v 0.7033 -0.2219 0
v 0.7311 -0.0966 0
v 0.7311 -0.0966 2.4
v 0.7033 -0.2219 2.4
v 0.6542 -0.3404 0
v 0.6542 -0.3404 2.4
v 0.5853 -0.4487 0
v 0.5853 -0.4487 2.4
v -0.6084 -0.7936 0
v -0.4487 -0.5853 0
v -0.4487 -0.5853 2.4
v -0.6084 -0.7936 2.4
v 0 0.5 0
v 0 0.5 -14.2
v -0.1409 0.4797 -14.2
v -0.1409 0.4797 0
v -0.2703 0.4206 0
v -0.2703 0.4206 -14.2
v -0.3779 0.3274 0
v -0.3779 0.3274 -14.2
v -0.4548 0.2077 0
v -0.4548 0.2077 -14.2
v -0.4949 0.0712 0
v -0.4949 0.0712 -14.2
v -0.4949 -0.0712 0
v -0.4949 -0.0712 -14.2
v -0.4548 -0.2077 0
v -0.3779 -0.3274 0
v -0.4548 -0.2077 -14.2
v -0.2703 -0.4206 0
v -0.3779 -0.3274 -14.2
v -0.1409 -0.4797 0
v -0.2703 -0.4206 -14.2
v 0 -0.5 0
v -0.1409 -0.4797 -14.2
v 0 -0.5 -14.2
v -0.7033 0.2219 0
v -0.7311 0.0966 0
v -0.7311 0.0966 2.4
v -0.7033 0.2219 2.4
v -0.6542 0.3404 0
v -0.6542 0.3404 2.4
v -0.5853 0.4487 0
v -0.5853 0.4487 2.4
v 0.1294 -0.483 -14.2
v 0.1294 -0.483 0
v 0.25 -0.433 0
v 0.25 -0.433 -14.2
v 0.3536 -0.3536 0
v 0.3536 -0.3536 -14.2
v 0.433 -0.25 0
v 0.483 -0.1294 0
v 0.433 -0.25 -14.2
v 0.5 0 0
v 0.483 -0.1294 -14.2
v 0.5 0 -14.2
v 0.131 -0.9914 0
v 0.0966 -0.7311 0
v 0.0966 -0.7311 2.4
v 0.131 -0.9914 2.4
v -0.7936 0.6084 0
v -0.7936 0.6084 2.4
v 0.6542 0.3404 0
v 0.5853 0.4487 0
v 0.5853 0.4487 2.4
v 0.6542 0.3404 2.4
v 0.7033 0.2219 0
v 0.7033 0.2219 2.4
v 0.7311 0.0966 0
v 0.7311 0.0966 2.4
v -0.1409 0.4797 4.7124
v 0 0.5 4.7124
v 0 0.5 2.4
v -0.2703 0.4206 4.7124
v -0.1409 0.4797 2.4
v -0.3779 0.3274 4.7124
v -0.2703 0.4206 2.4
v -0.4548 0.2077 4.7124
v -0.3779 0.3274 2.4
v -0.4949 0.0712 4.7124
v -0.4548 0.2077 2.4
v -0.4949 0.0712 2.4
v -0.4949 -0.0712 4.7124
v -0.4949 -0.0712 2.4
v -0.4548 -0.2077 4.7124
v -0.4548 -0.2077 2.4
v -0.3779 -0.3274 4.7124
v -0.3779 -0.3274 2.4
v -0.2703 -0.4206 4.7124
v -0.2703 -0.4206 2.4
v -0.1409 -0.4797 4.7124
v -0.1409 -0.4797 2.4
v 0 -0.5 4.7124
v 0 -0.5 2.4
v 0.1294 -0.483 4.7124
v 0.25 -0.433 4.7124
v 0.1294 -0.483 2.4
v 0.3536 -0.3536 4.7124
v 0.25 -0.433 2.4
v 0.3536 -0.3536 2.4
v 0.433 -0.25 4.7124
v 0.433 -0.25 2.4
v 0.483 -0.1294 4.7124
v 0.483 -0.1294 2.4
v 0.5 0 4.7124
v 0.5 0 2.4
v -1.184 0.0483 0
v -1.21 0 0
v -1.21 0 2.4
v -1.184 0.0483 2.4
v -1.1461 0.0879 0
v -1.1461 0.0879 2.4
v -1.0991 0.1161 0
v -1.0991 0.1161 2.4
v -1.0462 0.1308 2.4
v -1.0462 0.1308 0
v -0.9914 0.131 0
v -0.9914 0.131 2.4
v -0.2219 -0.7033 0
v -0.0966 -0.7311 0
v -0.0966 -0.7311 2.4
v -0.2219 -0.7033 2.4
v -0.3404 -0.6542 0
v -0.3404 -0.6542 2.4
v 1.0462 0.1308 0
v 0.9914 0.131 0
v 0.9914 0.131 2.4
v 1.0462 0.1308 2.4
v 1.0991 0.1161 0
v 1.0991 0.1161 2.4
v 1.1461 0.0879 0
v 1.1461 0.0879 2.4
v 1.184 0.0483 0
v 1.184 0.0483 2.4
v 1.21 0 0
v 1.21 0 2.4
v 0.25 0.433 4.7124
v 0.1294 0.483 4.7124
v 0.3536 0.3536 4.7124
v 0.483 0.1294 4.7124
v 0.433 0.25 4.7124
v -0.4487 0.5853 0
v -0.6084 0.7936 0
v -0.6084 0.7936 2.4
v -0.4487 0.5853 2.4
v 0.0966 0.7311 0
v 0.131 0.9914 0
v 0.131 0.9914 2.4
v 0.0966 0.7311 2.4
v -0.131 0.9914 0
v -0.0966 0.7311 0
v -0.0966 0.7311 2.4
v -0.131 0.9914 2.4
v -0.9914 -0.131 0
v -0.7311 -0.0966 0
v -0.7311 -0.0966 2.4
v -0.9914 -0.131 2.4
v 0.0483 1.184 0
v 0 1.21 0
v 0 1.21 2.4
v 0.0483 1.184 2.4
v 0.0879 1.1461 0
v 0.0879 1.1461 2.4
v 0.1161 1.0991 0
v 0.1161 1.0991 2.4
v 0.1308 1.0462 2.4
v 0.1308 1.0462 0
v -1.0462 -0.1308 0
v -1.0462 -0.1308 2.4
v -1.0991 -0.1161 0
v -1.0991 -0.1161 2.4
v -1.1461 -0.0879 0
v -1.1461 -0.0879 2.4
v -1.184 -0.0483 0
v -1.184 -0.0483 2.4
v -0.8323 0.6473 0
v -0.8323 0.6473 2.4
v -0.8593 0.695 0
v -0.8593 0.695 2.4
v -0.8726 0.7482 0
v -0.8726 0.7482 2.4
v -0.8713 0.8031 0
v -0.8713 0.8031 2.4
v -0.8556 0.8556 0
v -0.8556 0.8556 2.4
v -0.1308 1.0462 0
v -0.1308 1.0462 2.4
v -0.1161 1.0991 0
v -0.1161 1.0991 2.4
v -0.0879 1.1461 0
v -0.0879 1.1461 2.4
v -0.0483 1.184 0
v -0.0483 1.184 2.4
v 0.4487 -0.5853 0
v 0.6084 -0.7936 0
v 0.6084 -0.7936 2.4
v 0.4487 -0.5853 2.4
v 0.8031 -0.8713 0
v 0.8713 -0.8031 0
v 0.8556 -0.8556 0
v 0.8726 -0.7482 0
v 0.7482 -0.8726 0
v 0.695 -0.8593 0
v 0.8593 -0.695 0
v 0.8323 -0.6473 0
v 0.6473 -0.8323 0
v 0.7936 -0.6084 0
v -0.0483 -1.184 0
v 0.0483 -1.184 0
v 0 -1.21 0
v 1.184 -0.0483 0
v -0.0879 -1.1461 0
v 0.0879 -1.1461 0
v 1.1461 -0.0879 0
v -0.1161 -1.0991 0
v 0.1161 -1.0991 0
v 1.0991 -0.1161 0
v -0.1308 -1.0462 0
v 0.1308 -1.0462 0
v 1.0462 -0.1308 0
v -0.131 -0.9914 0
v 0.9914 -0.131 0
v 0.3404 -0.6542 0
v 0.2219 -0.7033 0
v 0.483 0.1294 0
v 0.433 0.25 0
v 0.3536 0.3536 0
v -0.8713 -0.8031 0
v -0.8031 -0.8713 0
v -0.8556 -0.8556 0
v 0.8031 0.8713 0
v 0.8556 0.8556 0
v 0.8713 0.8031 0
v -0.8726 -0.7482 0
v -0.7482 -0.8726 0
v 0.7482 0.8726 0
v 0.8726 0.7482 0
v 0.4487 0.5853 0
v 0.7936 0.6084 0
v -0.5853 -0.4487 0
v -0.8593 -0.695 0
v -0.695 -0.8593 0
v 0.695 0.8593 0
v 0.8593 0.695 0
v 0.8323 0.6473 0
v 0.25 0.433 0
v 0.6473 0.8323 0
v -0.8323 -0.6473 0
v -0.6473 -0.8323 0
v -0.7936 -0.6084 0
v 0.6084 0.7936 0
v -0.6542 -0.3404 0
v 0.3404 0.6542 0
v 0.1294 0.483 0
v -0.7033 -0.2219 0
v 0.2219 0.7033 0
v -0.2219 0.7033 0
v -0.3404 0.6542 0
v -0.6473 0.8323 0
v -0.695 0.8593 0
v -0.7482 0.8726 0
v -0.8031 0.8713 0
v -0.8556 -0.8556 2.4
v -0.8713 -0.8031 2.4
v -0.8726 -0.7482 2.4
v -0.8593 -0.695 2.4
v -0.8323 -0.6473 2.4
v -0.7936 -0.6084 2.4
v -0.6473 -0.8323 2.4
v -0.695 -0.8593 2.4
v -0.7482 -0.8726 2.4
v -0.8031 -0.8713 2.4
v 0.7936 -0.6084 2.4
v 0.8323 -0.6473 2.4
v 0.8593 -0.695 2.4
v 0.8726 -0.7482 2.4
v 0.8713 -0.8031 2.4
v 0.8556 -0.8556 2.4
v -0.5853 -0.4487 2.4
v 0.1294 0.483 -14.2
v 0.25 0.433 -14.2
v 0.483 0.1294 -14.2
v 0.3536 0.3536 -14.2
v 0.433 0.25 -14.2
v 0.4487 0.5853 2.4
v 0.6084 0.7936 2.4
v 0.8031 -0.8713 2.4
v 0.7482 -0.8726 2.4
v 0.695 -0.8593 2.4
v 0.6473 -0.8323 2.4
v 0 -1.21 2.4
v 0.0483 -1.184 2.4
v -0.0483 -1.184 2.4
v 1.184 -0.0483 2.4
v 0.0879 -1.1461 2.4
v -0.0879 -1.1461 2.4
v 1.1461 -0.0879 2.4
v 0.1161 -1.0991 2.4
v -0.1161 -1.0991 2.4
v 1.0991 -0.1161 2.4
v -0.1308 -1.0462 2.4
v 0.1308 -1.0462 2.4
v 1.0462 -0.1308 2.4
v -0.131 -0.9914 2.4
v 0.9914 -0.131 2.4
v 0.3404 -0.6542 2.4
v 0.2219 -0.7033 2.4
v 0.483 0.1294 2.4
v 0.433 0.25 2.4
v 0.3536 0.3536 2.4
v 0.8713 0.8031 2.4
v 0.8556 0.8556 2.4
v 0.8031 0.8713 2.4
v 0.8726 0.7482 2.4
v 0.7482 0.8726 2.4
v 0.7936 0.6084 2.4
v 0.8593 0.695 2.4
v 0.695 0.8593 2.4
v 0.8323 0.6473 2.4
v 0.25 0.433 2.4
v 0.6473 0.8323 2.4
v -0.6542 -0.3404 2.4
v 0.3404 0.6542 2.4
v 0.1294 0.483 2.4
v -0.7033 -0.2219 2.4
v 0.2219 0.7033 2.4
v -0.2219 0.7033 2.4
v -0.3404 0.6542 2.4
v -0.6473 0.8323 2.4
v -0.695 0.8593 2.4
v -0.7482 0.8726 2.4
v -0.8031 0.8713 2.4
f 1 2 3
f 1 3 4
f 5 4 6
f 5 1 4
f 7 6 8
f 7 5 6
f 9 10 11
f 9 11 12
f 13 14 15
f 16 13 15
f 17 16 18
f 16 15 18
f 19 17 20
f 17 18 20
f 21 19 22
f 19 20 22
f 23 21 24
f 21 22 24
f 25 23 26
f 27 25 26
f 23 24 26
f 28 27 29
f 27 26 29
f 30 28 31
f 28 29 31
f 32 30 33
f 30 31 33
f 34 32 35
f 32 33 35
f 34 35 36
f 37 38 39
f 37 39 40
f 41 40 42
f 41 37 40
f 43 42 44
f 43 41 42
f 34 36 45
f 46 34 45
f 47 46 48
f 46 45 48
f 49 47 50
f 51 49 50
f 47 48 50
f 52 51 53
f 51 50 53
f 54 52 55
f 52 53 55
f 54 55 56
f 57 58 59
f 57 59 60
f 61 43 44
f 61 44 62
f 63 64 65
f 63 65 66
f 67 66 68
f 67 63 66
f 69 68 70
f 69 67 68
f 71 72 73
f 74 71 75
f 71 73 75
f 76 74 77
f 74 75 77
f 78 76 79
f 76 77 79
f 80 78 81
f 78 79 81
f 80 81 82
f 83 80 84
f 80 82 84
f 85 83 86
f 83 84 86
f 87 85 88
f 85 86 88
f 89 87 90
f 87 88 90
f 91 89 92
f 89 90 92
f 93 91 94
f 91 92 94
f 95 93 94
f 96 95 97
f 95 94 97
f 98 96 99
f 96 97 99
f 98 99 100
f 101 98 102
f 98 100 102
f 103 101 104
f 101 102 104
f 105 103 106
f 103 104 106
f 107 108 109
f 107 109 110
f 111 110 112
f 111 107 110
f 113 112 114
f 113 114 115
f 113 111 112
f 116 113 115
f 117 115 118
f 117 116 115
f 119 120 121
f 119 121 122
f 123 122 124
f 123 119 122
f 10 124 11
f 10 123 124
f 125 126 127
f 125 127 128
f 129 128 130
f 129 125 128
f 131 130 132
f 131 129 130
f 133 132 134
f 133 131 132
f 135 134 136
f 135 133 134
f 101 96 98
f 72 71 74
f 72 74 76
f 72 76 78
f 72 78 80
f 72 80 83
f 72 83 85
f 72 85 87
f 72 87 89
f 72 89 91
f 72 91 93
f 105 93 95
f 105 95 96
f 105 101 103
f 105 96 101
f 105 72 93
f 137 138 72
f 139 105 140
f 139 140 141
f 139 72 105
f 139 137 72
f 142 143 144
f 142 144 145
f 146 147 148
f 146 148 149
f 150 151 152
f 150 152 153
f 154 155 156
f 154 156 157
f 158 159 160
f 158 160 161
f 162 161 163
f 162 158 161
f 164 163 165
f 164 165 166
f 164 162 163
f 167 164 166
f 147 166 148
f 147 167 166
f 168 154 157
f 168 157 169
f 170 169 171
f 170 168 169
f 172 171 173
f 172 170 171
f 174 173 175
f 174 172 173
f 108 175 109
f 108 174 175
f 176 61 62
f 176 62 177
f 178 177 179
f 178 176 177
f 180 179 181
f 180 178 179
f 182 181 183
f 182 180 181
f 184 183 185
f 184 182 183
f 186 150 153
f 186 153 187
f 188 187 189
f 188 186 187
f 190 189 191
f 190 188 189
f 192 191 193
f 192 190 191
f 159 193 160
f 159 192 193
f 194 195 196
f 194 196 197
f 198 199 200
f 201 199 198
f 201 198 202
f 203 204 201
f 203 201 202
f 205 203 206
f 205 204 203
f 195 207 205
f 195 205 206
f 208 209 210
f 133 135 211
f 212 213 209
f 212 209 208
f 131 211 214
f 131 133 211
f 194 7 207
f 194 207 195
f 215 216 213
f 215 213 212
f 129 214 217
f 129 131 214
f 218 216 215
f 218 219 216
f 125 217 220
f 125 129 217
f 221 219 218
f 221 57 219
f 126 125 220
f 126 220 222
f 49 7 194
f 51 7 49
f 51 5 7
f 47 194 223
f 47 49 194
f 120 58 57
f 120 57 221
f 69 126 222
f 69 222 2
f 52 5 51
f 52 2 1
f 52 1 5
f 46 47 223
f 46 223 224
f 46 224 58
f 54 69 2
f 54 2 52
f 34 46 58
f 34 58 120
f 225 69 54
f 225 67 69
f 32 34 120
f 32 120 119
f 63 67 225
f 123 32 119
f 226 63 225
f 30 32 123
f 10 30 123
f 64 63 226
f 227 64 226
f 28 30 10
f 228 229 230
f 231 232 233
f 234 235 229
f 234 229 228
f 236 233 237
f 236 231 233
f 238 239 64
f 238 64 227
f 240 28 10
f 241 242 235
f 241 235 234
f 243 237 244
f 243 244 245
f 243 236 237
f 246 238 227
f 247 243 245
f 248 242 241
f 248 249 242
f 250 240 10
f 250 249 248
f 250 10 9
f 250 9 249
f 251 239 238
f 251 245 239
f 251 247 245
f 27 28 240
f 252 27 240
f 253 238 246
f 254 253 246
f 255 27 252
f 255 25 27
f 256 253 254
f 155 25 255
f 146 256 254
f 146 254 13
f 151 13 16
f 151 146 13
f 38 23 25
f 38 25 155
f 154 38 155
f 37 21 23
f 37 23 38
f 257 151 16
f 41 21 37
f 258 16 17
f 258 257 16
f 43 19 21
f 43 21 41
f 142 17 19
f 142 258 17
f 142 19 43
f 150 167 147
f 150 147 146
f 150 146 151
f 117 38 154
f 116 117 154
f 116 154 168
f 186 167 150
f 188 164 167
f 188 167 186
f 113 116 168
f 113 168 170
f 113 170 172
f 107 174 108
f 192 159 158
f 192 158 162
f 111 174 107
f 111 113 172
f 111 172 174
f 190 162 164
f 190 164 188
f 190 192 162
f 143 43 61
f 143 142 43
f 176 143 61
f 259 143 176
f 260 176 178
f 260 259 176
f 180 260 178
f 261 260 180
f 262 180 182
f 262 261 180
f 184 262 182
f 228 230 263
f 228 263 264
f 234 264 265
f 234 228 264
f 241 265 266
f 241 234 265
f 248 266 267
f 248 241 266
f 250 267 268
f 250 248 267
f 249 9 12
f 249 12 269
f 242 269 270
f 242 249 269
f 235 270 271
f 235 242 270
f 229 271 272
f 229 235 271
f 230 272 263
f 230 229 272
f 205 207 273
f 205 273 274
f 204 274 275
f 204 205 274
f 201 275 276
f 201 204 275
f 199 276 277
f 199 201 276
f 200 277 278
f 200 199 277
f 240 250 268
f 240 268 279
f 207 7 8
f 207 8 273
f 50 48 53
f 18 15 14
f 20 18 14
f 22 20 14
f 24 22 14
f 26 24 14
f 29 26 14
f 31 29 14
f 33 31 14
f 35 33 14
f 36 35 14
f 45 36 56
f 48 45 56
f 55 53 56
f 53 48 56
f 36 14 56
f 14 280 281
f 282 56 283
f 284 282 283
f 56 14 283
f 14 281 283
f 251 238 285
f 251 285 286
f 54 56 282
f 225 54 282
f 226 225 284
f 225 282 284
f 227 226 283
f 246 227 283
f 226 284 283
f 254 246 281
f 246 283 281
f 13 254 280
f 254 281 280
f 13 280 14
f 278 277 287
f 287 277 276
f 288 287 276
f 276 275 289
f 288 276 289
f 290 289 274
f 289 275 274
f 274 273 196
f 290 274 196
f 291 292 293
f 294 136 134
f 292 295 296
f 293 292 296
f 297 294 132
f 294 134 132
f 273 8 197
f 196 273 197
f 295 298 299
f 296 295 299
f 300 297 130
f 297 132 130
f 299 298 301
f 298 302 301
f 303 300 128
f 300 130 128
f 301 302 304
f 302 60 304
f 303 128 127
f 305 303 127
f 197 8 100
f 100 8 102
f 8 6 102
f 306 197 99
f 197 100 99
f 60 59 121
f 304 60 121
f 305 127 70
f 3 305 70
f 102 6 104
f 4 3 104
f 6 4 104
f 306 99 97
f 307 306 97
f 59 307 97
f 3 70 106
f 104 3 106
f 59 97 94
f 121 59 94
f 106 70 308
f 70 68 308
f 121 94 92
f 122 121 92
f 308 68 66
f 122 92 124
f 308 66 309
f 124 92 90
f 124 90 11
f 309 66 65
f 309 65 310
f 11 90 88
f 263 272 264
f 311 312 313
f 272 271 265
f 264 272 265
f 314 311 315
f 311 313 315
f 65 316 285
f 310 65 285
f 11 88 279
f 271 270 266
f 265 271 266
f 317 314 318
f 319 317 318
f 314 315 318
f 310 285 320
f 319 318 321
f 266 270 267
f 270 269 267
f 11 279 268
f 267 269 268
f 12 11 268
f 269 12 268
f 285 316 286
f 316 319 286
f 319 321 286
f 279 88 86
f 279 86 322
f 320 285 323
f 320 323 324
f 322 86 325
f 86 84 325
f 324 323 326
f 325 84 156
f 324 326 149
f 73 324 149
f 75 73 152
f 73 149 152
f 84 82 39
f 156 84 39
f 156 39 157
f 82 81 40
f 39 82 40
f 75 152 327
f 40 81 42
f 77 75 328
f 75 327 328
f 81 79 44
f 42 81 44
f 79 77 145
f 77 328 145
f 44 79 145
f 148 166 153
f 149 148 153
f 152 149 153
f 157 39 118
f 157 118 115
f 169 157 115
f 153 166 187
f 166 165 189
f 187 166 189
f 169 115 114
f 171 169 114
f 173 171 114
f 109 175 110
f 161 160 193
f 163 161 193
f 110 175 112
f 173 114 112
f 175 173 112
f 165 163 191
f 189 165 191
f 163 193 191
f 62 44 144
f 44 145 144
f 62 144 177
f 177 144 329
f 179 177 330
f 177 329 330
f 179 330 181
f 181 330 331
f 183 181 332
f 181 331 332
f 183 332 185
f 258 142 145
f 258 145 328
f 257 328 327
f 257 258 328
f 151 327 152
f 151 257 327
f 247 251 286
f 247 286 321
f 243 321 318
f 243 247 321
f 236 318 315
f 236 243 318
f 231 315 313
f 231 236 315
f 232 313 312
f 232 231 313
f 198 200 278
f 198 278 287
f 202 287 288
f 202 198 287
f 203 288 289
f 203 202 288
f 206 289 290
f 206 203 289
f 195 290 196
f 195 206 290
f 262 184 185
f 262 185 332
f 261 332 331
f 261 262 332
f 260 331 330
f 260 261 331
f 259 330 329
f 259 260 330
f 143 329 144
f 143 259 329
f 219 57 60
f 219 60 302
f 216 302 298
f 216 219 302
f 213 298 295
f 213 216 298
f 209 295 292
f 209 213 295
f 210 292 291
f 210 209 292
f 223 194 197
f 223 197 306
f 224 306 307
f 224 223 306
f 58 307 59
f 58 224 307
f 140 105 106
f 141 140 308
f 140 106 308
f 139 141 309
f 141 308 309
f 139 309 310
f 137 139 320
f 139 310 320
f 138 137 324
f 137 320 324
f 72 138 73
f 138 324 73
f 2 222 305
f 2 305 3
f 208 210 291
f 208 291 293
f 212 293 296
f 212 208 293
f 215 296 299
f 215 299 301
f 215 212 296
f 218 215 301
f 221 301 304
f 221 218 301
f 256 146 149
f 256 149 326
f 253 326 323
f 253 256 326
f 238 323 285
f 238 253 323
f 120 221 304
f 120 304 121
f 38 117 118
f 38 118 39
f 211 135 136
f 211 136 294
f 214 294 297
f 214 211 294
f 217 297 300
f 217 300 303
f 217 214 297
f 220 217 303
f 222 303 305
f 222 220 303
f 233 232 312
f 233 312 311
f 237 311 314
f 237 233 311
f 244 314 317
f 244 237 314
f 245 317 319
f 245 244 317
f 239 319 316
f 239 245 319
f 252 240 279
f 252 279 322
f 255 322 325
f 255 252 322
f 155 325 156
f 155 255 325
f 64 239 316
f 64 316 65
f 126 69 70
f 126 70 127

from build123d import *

# Parameters (mm, degrees)
SKETCH1_R                = 0.5
BOSS_EXTRUDE1_DEPTH      = 2.4
BOSS_EXTRUDE3_DEPTH      = 4.7124
BOSS_EXTRUDE3_DEPTH_BACK = 14.2
SKETCH1_3_R              = 0.5


with BuildPart() as part:
    # Sketch1 → Boss-Extrude1 (new body)
    with BuildSketch(Plane.XY):
        with BuildLine():
            Line((-0.096588215, 0.731147705), (-0.130967072, 0.991386719))
            ThreePointArc((-0.130967072, 0.991386719), (-0.103602162, 1.123529505), (0, 1.21))
            ThreePointArc((0, 1.21), (0.103602162, 1.123529505), (0.130967072, 0.991386719))
            Line((0.130967072, 0.991386719), (0.096588215, 0.731147705))
            ThreePointArc((0.096588215, 0.731147705), (0.282229031, 0.681361155), (0.448701318, 0.585297682))
            Line((0.448701318, 0.585297682), (0.608408567, 0.793623976))
            ThreePointArc((0.608408567, 0.793623976), (0.721197541, 0.867713123), (0.855599205, 0.855599205))
            ThreePointArc((0.855599205, 0.855599205), (0.867713123, 0.721197541), (0.793623976, 0.608408567))
            Line((0.793623976, 0.608408567), (0.585297682, 0.448701318))
            ThreePointArc((0.585297682, 0.448701318), (0.681361155, 0.282229031), (0.731147705, 0.096588215))
            Line((0.731147705, 0.096588215), (0.991386719, 0.130967072))
            ThreePointArc((0.991386719, 0.130967072), (1.123529505, 0.103602162), (1.21, 0))
            ThreePointArc((1.21, 0), (1.123529505, -0.103602162), (0.991386719, -0.130967072))
            Line((0.991386719, -0.130967072), (0.731147705, -0.096588215))
            ThreePointArc((0.731147705, -0.096588215), (0.681361155, -0.282229031), (0.585297682, -0.448701318))
            Line((0.585297682, -0.448701318), (0.793623976, -0.608408567))
            ThreePointArc((0.793623976, -0.608408567), (0.867713123, -0.721197541), (0.855599205, -0.855599205))
            ThreePointArc((0.855599205, -0.855599205), (0.721197541, -0.867713123), (0.608408567, -0.793623976))
            Line((0.608408567, -0.793623976), (0.448701318, -0.585297682))
            ThreePointArc((0.448701318, -0.585297682), (0.282229031, -0.681361155), (0.096588215, -0.731147705))
            Line((0.096588215, -0.731147705), (0.130967072, -0.991386719))
            ThreePointArc((0.130967072, -0.991386719), (0.103602162, -1.123529505), (0, -1.21))
            ThreePointArc((0, -1.21), (-0.103602162, -1.123529505), (-0.130967072, -0.991386719))
            Line((-0.130967072, -0.991386719), (-0.096588215, -0.731147705))
            ThreePointArc((-0.096588215, -0.731147705), (-0.282229031, -0.681361155), (-0.448701318, -0.585297682))
            Line((-0.448701318, -0.585297682), (-0.608408567, -0.793623976))
            ThreePointArc((-0.608408567, -0.793623976), (-0.721197541, -0.867713123), (-0.855599205, -0.855599205))
            ThreePointArc((-0.855599205, -0.855599205), (-0.867713123, -0.721197541), (-0.793623976, -0.608408567))
            Line((-0.793623976, -0.608408567), (-0.585297682, -0.448701318))
            ThreePointArc((-0.585297682, -0.448701318), (-0.681361155, -0.282229031), (-0.731147705, -0.096588215))
            Line((-0.731147705, -0.096588215), (-0.991386719, -0.130967072))
            ThreePointArc((-0.991386719, -0.130967072), (-1.123529505, -0.103602162), (-1.21, 0))
            ThreePointArc((-1.21, 0), (-1.123529505, 0.103602162), (-0.991386719, 0.130967072))
            Line((-0.991386719, 0.130967072), (-0.731147705, 0.096588215))
            ThreePointArc((-0.731147705, 0.096588215), (-0.681361155, 0.282229031), (-0.585297682, 0.448701318))
            Line((-0.585297682, 0.448701318), (-0.793623976, 0.608408567))
            ThreePointArc((-0.793623976, 0.608408567), (-0.867713123, 0.721197541), (-0.855599205, 0.855599205))
            ThreePointArc((-0.855599205, 0.855599205), (-0.721197541, 0.867713123), (-0.608408567, 0.793623976))
            Line((-0.608408567, 0.793623976), (-0.448701318, 0.585297682))
            ThreePointArc((-0.448701318, 0.585297682), (-0.282229031, 0.681361155), (-0.096588215, 0.731147705))
        make_face()
        Circle(SKETCH1_R, mode=Mode.SUBTRACT)
    extrude(amount=BOSS_EXTRUDE1_DEPTH)

    # Sketch1<3> → Boss-Extrude3 (add, two sides: drawn at the far end of the back side and taken through both)
    with BuildSketch(Plane.XY.offset(-BOSS_EXTRUDE3_DEPTH_BACK)):
        Circle(SKETCH1_3_R)
    extrude(amount=BOSS_EXTRUDE3_DEPTH + BOSS_EXTRUDE3_DEPTH_BACK)


solid = part.part
